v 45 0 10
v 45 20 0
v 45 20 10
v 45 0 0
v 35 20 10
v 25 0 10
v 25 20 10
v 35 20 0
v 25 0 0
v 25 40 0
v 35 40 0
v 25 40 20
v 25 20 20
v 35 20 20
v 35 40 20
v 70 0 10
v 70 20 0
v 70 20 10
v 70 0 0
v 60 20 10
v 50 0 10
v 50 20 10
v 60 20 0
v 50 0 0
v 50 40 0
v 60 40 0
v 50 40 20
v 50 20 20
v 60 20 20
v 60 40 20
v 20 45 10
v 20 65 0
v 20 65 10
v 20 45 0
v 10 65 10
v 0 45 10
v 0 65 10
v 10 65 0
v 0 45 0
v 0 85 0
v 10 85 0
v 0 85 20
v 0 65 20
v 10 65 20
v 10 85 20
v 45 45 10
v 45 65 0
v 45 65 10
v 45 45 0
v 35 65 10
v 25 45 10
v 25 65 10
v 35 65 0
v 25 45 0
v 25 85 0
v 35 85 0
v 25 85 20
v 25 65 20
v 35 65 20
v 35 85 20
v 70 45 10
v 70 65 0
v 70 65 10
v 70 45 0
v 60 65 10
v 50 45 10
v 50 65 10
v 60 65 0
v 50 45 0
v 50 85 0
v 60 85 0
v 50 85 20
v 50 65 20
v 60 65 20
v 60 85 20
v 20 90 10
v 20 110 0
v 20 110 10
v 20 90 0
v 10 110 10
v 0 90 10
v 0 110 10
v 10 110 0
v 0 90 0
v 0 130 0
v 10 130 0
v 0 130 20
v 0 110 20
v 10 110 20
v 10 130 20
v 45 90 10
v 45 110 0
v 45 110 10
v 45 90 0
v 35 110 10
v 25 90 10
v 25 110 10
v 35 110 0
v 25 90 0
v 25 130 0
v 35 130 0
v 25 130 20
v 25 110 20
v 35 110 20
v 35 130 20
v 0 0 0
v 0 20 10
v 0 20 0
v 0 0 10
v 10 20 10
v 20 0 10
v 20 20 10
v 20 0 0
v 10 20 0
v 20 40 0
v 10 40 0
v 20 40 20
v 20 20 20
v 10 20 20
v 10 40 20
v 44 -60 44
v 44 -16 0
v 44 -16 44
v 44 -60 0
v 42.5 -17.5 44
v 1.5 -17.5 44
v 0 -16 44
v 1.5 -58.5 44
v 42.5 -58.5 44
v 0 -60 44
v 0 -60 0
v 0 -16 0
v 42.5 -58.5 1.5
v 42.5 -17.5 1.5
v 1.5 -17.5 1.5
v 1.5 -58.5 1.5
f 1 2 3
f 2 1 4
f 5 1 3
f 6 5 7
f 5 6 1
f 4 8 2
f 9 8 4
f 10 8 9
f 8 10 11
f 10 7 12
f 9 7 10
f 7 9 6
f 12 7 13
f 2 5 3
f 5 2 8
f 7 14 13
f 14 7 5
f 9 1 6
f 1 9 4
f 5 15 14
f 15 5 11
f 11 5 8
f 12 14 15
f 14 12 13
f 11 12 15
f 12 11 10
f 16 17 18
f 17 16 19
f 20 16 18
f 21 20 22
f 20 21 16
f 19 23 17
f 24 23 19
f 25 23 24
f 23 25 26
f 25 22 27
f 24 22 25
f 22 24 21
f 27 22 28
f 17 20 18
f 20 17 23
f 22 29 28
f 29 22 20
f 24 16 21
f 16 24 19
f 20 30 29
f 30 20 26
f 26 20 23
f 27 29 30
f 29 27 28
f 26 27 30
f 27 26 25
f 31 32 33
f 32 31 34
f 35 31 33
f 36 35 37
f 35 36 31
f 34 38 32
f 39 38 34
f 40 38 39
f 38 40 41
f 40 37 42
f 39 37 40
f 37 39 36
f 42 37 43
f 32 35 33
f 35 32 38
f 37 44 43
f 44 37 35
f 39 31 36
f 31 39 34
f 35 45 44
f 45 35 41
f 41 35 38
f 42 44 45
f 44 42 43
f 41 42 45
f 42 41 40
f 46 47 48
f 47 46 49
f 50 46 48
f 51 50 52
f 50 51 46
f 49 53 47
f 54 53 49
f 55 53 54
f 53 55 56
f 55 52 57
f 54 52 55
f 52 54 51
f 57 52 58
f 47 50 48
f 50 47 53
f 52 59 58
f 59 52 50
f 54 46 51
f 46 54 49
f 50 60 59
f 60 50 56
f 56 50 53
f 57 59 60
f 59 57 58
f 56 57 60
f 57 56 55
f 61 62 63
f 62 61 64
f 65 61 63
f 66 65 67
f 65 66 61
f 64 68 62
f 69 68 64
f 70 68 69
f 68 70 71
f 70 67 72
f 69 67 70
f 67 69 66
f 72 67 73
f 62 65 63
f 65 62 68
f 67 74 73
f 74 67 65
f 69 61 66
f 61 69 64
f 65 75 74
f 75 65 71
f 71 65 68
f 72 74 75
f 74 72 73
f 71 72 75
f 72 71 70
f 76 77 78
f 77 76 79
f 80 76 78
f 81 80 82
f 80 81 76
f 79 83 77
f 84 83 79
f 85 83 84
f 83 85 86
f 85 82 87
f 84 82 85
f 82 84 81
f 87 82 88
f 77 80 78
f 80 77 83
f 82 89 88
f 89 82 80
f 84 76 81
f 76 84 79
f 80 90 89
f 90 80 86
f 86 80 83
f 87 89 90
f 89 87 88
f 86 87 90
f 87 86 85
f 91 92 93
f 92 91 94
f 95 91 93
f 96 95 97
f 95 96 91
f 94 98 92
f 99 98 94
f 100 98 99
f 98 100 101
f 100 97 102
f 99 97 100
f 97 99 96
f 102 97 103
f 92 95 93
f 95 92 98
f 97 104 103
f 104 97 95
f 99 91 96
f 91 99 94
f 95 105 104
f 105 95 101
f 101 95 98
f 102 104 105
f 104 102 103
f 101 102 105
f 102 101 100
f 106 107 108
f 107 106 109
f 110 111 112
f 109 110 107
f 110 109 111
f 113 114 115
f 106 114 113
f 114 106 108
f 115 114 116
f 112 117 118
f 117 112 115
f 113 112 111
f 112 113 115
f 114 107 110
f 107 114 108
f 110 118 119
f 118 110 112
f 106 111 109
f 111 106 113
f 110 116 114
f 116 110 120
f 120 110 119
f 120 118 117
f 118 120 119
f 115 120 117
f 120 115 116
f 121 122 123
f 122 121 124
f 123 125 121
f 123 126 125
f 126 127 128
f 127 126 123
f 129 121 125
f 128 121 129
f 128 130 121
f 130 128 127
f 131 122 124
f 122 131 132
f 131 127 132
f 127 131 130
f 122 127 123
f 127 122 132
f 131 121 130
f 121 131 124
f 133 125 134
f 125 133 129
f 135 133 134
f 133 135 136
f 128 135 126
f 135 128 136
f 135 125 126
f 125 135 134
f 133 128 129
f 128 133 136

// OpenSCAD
// puzzle from "Kvantik" 07-2019
// The task is to assemble box 2x2 from 7 pieces of type A and 1 piece of 
// type B (which is a mirror of A). There is a single way of doing this.

// how many pieces to generate
make_pieces_a = 7;  // 7
make_piece_b = true;  
make_box = true;

// side of single item in mm
side_size = 20;
// thickness of box walls
box_walls = 1.5;
// extra space to add to the box
box_delta = 1;

// end of user customizable parameters list
module puzzle_piece_a() {
    union() {
        cube([side_size, side_size, side_size/2]);
        translate([0, side_size, 0])
        cube([side_size/2, side_size, side_size]);
    }
}

module puzzle_piece_b() {
    translate([side_size, 0, 0])
    mirror([1, 0, 0])
    puzzle_piece_a();
}

if (make_pieces_a > 0) { 
    s = ceil(sqrt(make_pieces_a));
    for (i = [1:make_pieces_a]) {
        y = floor(i/s);
        x = i - y*s;
        translate([(side_size+5)*x, y*(side_size*2+5), 0])
        puzzle_piece_a();
    }
}

if (make_piece_b) {
    puzzle_piece_b();
}

if (make_box) {
    translate([0, -side_size*3, 0])
    puzzle_box();
}

module puzzle_box() {
    side_inner = side_size*2 + box_delta;
    side_outer = side_inner + box_walls*2;
    difference() {
        cube([side_outer, side_outer, side_outer]);
        translate([box_walls, box_walls, box_walls])
        cube([side_inner, side_inner, side_inner*2]);
    }
    
}
